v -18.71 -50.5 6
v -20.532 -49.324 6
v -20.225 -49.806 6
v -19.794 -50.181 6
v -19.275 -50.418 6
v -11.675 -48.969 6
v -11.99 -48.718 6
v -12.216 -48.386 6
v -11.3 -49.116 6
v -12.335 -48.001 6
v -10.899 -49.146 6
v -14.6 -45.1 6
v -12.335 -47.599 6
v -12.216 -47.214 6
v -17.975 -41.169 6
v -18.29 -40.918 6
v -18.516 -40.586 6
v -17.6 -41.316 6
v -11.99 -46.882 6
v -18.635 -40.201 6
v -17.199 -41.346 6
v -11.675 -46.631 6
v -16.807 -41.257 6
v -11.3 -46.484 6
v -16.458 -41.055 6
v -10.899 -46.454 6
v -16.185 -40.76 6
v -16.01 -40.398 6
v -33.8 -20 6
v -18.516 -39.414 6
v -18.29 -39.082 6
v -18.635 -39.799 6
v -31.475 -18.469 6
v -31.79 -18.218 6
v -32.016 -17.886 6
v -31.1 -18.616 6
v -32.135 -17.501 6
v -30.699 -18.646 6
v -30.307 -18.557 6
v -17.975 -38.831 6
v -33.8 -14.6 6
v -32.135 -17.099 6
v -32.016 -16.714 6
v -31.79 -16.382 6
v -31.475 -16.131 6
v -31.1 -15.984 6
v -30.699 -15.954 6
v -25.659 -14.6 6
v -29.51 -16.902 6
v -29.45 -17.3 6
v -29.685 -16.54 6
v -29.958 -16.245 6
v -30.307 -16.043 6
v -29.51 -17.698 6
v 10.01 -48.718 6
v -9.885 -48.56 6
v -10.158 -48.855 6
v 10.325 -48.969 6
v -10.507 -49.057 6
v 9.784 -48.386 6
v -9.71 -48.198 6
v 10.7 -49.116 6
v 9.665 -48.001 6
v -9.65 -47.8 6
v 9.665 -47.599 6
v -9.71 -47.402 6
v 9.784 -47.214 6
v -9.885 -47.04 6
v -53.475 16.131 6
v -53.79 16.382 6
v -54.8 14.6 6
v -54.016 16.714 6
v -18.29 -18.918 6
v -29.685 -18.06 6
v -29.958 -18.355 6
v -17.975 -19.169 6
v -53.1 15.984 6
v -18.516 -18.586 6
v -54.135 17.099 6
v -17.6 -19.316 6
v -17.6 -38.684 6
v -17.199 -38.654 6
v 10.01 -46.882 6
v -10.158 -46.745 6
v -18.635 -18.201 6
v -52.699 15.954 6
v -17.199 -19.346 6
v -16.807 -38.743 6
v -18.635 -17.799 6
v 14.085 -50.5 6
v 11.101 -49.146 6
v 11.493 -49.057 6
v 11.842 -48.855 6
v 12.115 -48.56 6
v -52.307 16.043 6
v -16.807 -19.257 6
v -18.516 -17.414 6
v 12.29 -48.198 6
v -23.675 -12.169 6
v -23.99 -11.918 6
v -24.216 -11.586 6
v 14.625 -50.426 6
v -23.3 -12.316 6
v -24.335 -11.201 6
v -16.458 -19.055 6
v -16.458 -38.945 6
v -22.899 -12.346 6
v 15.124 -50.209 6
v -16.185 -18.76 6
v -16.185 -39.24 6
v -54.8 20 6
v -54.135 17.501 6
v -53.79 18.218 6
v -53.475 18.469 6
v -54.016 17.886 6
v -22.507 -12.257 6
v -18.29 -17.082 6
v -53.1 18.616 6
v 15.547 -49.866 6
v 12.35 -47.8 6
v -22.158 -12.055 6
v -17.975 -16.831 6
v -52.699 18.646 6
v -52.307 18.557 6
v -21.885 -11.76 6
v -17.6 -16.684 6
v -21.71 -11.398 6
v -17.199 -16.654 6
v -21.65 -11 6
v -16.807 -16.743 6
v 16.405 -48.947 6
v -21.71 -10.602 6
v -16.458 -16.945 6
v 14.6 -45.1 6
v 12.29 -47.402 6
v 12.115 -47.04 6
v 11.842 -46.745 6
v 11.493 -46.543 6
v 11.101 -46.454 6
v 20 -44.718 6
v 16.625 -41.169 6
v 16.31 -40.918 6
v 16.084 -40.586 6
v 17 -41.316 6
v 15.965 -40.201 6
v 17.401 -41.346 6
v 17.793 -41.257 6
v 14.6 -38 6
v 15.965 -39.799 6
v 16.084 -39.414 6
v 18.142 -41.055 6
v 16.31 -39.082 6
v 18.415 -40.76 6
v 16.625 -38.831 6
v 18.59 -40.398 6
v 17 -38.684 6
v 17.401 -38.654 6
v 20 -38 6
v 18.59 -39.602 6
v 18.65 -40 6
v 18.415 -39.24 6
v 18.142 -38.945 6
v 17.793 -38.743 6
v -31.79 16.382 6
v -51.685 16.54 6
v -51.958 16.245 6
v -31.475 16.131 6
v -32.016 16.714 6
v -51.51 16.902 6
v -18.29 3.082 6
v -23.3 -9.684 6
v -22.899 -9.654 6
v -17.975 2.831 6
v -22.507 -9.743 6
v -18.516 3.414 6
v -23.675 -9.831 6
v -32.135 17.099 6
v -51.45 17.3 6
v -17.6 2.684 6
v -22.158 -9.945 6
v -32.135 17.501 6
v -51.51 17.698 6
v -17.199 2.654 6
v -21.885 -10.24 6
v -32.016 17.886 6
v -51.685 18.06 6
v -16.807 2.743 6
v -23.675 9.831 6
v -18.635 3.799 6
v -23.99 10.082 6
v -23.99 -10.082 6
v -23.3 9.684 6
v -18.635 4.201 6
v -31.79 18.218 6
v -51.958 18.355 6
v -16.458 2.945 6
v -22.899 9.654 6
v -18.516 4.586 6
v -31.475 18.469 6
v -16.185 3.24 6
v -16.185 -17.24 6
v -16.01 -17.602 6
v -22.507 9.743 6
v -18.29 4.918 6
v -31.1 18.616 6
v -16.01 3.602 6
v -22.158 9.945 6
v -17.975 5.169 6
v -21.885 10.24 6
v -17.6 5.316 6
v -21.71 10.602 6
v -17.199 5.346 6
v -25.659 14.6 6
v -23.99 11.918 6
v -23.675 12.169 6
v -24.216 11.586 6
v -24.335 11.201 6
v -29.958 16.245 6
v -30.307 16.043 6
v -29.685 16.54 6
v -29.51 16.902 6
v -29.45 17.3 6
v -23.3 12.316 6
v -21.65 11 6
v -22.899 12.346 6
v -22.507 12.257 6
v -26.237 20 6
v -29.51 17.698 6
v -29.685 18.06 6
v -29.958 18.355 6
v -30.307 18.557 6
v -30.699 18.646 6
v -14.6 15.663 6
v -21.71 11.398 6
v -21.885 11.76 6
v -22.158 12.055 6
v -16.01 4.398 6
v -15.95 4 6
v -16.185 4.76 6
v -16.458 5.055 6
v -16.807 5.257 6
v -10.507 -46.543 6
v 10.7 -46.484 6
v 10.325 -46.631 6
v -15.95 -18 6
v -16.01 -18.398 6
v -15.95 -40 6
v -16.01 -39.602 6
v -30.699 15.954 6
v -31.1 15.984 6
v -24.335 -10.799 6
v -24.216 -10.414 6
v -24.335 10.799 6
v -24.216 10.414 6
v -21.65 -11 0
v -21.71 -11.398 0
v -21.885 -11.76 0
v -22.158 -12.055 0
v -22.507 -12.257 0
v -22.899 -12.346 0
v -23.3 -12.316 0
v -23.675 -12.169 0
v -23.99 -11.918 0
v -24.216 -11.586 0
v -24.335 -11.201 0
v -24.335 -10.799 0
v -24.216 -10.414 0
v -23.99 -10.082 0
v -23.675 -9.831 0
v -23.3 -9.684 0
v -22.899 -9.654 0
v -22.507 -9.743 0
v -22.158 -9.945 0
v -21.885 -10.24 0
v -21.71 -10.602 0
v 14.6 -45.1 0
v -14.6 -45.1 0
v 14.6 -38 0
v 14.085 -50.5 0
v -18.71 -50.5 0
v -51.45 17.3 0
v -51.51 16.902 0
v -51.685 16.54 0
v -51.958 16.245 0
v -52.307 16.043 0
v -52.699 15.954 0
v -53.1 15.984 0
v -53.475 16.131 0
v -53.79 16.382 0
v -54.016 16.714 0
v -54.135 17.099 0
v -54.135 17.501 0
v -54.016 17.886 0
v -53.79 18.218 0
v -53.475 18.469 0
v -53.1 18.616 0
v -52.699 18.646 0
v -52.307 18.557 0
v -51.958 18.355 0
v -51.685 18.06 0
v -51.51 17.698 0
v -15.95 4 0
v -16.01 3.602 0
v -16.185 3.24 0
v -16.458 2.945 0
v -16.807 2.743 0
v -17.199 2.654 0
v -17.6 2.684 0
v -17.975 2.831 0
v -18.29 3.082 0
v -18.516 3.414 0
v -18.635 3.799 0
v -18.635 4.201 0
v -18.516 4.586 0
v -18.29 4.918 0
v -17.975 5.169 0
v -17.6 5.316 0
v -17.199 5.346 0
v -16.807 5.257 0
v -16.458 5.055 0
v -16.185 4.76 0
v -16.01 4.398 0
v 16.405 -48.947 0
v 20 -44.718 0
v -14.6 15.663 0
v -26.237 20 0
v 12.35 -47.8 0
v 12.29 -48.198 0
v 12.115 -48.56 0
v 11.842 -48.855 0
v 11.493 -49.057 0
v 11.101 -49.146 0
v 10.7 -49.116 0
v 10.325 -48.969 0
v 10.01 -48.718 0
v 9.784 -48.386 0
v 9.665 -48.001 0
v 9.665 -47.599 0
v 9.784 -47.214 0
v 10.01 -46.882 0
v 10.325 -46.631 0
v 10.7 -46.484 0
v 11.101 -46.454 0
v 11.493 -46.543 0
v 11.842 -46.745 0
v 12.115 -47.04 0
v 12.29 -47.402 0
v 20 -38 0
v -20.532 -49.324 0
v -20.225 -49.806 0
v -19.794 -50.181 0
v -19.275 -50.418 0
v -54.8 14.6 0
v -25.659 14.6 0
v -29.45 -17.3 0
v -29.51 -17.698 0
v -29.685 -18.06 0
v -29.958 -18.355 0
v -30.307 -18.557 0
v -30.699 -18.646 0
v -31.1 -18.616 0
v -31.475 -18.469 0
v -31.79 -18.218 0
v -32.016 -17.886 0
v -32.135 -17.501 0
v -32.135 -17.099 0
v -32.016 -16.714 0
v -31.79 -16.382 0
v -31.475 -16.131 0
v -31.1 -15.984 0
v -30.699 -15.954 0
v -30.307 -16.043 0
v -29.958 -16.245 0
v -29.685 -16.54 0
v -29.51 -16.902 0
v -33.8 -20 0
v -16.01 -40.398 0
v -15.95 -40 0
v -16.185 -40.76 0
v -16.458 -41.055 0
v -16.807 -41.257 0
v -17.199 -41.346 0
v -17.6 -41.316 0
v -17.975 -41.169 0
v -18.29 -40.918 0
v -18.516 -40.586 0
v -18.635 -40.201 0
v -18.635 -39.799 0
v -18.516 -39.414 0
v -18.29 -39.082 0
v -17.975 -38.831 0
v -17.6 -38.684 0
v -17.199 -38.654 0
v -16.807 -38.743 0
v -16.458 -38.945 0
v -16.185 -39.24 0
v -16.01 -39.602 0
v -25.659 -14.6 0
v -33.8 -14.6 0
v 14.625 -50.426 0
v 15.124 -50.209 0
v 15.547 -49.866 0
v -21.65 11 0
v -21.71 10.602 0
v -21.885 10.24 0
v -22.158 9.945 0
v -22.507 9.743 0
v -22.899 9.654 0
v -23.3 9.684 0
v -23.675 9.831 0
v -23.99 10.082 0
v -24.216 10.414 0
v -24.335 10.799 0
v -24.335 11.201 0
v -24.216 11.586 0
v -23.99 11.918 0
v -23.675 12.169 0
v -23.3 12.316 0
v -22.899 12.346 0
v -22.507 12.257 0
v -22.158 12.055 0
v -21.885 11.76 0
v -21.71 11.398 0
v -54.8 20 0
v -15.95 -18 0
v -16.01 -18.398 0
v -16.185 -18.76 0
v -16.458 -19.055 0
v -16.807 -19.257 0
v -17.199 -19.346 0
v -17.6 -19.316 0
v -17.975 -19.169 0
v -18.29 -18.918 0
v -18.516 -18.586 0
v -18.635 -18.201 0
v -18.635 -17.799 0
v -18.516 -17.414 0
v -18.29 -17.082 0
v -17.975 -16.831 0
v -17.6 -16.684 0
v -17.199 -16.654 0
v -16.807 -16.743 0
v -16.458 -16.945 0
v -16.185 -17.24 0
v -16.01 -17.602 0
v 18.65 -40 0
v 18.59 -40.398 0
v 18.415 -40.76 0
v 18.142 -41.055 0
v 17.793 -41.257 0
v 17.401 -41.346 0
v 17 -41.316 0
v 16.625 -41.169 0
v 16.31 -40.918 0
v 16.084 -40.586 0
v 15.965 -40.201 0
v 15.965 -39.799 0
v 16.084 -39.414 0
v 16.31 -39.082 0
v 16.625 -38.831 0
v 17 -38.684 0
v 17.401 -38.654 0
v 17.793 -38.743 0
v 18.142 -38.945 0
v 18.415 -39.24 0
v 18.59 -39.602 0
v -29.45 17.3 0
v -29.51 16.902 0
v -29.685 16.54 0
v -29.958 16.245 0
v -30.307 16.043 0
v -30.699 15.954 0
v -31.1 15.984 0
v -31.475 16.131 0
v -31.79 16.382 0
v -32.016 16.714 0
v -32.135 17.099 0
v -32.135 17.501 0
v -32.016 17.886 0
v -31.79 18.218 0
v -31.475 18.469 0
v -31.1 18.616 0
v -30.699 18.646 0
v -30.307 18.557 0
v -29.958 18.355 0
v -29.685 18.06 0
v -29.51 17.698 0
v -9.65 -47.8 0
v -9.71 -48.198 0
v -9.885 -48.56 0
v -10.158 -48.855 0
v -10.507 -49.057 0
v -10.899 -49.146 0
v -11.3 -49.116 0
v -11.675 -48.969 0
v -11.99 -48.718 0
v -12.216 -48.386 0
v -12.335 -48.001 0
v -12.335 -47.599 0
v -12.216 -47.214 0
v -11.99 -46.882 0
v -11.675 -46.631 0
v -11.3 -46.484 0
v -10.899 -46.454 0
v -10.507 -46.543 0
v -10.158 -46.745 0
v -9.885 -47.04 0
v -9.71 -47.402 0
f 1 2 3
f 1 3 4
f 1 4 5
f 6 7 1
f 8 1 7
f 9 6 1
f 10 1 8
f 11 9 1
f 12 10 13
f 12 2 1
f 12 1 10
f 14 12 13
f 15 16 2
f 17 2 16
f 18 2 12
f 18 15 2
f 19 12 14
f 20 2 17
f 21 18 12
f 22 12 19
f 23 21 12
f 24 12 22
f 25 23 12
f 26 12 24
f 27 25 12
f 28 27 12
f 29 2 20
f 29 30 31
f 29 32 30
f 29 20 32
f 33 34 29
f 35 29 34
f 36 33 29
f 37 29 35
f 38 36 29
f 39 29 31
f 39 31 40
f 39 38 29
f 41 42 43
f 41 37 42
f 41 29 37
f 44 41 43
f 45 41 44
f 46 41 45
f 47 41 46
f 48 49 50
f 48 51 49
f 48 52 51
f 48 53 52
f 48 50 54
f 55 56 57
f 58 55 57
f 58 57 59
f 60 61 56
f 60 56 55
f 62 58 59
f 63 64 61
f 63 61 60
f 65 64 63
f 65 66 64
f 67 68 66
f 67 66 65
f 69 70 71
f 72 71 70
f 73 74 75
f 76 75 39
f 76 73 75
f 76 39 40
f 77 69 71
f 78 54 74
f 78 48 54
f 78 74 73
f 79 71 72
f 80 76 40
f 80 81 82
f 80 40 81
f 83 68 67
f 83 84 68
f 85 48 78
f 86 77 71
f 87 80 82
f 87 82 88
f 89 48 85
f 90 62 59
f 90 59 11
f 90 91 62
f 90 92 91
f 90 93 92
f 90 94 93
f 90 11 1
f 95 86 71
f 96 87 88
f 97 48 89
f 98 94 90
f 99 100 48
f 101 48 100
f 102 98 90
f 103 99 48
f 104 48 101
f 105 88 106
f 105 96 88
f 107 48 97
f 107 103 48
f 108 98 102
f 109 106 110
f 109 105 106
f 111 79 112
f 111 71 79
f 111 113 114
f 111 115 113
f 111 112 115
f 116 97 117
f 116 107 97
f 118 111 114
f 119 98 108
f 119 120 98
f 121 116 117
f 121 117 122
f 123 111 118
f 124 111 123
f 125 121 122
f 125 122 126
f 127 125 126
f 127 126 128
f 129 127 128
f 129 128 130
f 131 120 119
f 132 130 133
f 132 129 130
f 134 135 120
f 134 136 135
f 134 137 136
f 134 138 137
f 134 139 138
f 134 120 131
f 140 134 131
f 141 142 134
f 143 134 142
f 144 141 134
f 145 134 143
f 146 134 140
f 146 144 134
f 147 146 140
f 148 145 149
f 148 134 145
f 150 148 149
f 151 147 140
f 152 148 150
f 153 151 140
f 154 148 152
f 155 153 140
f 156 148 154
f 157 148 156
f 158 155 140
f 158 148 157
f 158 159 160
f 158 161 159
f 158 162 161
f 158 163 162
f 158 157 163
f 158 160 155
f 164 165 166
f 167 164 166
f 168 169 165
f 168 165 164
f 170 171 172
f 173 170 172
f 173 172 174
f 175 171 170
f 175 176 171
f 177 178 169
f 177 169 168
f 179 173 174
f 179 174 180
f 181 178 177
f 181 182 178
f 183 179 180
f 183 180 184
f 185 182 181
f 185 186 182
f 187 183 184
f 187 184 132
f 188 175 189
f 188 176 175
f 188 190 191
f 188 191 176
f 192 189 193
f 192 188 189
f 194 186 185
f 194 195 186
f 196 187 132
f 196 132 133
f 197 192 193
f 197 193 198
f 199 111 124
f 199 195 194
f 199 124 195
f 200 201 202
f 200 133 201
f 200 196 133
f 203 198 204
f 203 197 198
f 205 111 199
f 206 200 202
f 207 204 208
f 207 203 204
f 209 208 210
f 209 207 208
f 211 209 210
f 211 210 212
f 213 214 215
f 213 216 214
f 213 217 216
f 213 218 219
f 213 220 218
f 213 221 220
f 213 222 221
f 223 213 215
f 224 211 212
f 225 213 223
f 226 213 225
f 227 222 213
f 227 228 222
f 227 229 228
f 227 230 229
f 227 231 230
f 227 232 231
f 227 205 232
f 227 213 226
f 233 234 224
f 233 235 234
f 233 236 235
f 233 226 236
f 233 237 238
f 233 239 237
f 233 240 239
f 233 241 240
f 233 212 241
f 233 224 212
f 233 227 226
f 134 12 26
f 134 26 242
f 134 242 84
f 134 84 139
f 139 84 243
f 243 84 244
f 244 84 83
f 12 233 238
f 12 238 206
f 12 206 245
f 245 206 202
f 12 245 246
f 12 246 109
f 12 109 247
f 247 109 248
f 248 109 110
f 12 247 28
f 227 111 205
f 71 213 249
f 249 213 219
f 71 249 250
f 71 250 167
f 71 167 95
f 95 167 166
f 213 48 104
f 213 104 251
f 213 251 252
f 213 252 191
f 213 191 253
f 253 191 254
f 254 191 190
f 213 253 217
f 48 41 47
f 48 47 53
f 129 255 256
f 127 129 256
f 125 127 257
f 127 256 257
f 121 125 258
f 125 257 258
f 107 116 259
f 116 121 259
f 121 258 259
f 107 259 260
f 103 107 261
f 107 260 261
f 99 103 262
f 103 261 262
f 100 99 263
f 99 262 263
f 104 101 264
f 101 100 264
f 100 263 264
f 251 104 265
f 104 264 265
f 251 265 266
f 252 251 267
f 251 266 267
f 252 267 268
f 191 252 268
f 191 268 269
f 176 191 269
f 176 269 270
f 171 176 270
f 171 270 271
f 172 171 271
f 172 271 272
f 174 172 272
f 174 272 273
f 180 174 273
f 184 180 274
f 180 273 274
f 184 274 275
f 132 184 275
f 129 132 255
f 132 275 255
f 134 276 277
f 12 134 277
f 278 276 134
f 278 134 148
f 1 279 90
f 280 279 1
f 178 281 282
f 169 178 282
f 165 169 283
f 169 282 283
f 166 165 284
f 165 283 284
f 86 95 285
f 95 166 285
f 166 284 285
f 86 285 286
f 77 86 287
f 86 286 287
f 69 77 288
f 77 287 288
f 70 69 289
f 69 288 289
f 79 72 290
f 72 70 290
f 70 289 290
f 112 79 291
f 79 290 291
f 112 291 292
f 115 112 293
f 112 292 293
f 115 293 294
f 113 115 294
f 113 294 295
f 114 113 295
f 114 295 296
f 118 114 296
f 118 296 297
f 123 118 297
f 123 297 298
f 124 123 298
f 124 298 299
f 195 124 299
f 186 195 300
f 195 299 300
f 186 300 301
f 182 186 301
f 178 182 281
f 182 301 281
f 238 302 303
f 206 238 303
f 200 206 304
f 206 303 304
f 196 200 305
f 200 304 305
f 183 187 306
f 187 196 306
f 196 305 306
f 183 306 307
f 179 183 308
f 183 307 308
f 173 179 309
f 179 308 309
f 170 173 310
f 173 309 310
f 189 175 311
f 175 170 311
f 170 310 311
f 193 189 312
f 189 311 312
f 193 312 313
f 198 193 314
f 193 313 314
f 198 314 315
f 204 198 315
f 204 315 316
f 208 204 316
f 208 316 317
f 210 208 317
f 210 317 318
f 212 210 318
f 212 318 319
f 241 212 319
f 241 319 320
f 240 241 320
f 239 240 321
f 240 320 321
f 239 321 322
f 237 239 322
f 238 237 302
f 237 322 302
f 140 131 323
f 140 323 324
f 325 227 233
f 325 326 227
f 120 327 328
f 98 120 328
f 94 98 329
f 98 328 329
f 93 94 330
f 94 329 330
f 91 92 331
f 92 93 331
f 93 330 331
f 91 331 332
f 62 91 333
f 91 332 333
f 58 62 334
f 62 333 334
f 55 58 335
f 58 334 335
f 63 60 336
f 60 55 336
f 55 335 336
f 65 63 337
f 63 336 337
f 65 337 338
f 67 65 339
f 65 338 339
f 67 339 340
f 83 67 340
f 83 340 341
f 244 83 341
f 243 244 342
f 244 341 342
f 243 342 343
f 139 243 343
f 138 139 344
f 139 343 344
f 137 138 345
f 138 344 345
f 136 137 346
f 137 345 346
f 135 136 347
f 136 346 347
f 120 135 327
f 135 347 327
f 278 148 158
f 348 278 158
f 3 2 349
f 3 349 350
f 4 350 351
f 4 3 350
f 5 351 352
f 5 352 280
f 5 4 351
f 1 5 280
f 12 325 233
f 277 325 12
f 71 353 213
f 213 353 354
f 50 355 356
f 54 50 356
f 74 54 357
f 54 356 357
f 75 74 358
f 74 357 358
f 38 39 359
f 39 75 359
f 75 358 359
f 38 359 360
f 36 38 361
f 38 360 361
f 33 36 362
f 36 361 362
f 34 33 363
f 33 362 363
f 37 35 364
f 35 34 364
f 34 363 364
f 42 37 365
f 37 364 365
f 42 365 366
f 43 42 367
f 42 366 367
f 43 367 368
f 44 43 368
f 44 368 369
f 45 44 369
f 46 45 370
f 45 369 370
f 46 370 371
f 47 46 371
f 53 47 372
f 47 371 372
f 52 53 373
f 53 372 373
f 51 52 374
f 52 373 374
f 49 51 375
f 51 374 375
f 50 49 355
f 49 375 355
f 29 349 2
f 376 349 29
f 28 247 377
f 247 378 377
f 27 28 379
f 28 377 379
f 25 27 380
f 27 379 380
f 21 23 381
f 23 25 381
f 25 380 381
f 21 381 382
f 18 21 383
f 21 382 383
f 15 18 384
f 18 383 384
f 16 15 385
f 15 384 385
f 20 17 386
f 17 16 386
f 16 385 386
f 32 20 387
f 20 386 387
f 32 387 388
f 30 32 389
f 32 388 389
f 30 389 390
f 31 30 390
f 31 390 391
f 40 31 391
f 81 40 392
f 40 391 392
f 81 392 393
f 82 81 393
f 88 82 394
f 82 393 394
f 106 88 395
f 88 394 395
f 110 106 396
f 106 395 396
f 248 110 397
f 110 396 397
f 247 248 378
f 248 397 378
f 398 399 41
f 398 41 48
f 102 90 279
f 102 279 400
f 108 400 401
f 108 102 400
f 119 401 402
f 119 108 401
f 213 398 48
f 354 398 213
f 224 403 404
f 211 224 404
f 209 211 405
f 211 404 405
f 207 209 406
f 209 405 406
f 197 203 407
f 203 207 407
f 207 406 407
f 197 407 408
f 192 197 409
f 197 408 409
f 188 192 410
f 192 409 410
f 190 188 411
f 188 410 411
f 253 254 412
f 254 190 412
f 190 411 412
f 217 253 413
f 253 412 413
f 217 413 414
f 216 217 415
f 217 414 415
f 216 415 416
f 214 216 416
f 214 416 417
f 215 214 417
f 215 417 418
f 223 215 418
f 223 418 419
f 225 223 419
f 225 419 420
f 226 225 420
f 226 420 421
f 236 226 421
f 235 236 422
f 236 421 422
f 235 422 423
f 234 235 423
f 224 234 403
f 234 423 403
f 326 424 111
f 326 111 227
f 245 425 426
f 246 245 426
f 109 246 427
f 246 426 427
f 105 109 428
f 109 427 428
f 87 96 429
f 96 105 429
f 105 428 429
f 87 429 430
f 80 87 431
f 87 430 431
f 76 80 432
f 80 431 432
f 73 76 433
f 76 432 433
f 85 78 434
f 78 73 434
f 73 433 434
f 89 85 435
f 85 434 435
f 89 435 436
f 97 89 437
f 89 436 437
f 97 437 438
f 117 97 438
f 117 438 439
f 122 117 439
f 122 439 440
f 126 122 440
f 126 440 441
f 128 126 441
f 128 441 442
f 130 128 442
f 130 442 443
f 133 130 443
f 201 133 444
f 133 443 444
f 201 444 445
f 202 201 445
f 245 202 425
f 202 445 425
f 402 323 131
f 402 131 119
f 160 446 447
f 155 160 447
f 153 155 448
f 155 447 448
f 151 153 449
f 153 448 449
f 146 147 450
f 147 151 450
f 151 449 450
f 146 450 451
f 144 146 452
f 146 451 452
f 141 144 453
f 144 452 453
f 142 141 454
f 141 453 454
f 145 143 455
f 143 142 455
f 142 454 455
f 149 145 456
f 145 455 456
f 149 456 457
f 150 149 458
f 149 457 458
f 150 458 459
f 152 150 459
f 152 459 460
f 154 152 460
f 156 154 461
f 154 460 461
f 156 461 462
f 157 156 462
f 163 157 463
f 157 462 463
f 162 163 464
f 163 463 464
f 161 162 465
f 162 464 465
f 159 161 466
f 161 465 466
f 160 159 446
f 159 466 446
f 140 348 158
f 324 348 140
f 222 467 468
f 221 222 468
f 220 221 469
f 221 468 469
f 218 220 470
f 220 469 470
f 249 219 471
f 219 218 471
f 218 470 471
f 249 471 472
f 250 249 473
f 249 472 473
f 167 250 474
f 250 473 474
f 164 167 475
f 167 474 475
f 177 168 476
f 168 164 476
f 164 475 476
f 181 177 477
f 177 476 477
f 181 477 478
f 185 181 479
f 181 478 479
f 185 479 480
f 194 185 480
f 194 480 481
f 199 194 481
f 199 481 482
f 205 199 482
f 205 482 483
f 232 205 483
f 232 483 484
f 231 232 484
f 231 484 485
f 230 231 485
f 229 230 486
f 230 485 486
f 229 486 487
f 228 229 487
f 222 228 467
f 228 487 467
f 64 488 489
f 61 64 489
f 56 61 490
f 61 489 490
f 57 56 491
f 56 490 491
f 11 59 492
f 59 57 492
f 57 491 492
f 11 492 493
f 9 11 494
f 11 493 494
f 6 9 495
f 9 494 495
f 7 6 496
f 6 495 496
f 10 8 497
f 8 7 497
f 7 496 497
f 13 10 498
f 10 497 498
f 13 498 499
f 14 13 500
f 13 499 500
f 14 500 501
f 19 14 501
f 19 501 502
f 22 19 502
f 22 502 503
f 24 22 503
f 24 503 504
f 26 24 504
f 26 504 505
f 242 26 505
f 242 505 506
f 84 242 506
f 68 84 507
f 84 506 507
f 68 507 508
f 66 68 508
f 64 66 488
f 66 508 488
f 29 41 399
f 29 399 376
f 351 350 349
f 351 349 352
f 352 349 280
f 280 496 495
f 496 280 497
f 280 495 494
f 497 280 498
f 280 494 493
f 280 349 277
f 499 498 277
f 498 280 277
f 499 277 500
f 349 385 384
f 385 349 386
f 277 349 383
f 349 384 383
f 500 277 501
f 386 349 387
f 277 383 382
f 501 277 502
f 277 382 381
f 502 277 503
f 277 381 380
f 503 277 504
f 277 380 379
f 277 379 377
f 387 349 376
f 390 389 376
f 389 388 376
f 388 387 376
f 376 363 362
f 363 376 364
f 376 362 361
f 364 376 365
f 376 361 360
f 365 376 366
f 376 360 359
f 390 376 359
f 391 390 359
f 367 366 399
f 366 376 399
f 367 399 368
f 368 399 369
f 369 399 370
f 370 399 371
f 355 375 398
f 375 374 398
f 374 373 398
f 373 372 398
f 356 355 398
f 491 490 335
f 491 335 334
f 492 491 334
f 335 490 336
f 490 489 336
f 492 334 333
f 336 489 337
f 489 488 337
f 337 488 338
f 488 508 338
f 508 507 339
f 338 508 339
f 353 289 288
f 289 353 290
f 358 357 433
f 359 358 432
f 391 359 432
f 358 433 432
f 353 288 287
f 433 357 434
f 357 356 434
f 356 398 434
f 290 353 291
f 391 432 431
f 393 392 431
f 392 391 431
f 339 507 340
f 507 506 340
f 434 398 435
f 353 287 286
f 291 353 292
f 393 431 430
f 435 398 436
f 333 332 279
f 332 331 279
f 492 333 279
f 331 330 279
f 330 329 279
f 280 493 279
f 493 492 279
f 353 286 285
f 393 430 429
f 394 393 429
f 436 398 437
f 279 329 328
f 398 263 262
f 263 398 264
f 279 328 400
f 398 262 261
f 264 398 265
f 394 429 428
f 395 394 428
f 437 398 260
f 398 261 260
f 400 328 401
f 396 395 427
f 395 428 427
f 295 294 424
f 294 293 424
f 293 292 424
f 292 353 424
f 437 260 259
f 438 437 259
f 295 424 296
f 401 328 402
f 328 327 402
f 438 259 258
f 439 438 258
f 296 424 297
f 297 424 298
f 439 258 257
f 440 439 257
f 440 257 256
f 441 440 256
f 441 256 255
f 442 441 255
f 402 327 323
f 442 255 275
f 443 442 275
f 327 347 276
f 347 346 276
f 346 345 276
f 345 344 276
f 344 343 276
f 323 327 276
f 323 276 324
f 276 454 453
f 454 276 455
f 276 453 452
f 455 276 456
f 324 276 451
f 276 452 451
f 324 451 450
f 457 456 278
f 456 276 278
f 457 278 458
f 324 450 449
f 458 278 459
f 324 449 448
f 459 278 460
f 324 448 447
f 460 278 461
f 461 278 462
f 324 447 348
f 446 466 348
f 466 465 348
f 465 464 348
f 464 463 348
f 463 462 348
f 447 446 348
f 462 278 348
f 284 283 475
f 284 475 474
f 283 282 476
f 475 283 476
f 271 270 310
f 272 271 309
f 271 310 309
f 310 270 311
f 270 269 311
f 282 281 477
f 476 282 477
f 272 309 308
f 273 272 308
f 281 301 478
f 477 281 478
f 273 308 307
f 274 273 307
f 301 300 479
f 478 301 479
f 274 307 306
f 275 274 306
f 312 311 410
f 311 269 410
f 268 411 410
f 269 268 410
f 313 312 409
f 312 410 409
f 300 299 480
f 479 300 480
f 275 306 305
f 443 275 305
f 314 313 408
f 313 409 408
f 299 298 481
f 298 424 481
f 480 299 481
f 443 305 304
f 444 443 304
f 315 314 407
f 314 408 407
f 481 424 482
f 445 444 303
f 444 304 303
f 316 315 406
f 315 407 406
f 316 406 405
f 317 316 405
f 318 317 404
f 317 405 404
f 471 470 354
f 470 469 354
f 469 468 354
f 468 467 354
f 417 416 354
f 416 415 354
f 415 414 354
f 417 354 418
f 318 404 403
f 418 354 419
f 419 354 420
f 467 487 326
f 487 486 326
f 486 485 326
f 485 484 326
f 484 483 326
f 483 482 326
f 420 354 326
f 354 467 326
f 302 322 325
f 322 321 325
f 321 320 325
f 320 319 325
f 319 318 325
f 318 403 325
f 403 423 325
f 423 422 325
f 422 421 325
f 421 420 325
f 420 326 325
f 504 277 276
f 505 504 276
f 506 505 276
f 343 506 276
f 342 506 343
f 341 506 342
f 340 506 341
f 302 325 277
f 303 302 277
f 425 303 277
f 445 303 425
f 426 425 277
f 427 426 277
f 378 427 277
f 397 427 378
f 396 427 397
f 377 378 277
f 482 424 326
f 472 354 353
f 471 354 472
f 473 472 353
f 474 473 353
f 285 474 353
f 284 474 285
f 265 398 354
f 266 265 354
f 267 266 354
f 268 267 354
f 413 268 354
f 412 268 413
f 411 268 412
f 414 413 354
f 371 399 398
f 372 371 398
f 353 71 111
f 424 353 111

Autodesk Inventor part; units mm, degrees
ref_plane "YZ Plane" through (0, 0, 0) normal (1, 0, 0) x (0, 1, 0)
ref_plane "XZ Plane" through (0, 0, 0) normal (0, 1, 0) x (-1, 0, 0)
ref_plane "XY Plane" through (0, 0, 0) normal (0, 0, 1) x (1, 0, 0)
ref_plane "작업 평면1" through (0, 0, 0) normal (0, 0, 1) x (1, 0, 0)
sketch "스케치1" plane through (0, 0, 0) normal (0, 0, 1) x (1, 0, 0)
  line L0 (-85.3, -15) -> (-85.3, -11.5) projected
  line L1 (-85.3, -15) -> (-79.3, -20.1) projected
  line L2 (-79.3, -20.1) -> (-26.2, -20.1) projected
  line L3 (-26.2, -20.1) -> (-20.2, -15) projected
  line L4 (-20.2, -15) -> (-20.2, 15) projected
  line L5 (-20.2, 15) -> (-26.2, 20.1) projected
  line L6 (-26.2, 20.1) -> (-79.3, 20.1) projected
  line L7 (-79.3, 20.1) -> (-85.3, 15) projected
  line L8 (-85.3, 11.5) -> (-85.3, 15) projected
  arc A0 (-82.3, 14.5) -> (-85.3, 11.5) centre (-82.3, 11.5) ccw projected
  line L9 (-28.8, 14.5) -> (-82.3, 14.5) projected
  arc A1 (-25.8, 11.5) -> (-28.8, 14.5) centre (-28.8, 11.5) ccw projected
  line L10 (-25.8, -11.5) -> (-25.8, 11.5) projected
  arc A2 (-28.8, -14.5) -> (-25.8, -11.5) centre (-28.8, -11.5) ccw projected
  line L11 (-82.3, -14.5) -> (-28.8, -14.5) projected
  arc A3 (-85.3, -11.5) -> (-82.3, -14.5) centre (-82.3, -11.5) ccw projected
  circle A4 centre (-74.8, 17.3) radius 1.35 projected
  circle A5 centre (-52.8, 17.3) radius 1.35 projected
  circle A6 centre (-30.8, 17.3) radius 1.35 projected
  circle A7 centre (-23, 11) radius 1.35 projected
  circle A8 centre (-74.8, -17.3) radius 1.35 projected
  circle A9 centre (-52.8, -17.3) radius 1.35 projected
  circle A10 centre (-30.8, -17.3) radius 1.35 projected
  circle A11 centre (-23, -11) radius 1.35 projected
  line L12 (-15, 14.5) -> (-11.5, 14.5) projected
  line L13 (-15, 14.5) -> (-20.1, 8.5) projected
  line L14 (-20.1, 8.5) -> (-20.1, -44.6) projected
  line L15 (-20.1, -44.6) -> (-15, -50.6) projected
  line L16 (-15, -50.6) -> (15, -50.6) projected
  line L17 (15, -50.6) -> (20.1, -44.6) projected
  line L18 (20.1, -44.6) -> (20.1, 8.5) projected
  line L19 (20.1, 8.5) -> (15, 14.5) projected
  line L20 (11.5, 14.5) -> (15, 14.5) projected
  arc A12 (14.5, 11.5) -> (11.5, 14.5) centre (11.5, 11.5) ccw projected
  line L21 (14.5, -42) -> (14.5, 11.5) projected
  arc A13 (11.5, -45) -> (14.5, -42) centre (11.5, -42) ccw projected
  line L22 (-11.5, -45) -> (11.5, -45) projected
  arc A14 (-14.5, -42) -> (-11.5, -45) centre (-11.5, -42) ccw projected
  line L23 (-14.5, 11.5) -> (-14.5, -42) projected
  arc A15 (-11.5, 14.5) -> (-14.5, 11.5) centre (-11.5, 11.5) ccw projected
  circle A16 centre (17.3, 4) radius 1.35 projected
  circle A17 centre (17.3, -18) radius 1.35 projected
  circle A18 centre (17.3, -40) radius 1.35 projected
  circle A19 centre (11, -47.8) radius 1.35 projected
  circle A20 centre (-17.3, 4) radius 1.35 projected
  circle A21 centre (-17.3, -18) radius 1.35 projected
  circle A22 centre (-17.3, -40) radius 1.35 projected
  circle A23 centre (-11, -47.8) radius 1.35 projected
  arc A24 (-14.6, -42) -> (-11.5, -45.1) centre (-11.5, -42) ccw
  line L24 (-11.5, -45.1) -> (11.5, -45.1)
  arc A25 (11.5, -45.1) -> (14.6, -42) centre (11.5, -42) ccw
  line L25 (14.6, -42) -> (14.6, 11.5)
  arc A26 (14.6, 11.5) -> (12.5954, 14.4) centre (11.5, 11.5) ccw
  line L26 (12.5954, 14.4) -> (14.9538, 14.4)
  line L27 (14.9538, 14.4) -> (20, 8.4632)
  line L28 (20, 8.4632) -> (20, -44.5632)
  line L29 (14.9538, -50.5) -> (-14.9538, -50.5)
  line L30 (-14.6, 11.5) -> (-14.6, -42)
  arc A27 (-25.7, 11.5) -> (-28.8, 14.6) centre (-28.8, 11.5) ccw
  line L31 (-28.8, 14.6) -> (-82.3, 14.6)
  arc A28 (-82.3, 14.6) -> (-85.2, 12.5954) centre (-82.3, 11.5) ccw
  line L32 (-85.2, 12.5954) -> (-85.2, 14.9538)
  line L33 (-85.2, 14.9538) -> (-79.2632, 20)
  line L34 (-79.2632, 20) -> (-26.2368, 20)
  line L35 (-20.3, -14.9538) -> (-26.2368, -20)
  line L36 (-26.2368, -20) -> (-79.2632, -20)
  line L37 (-79.2632, -20) -> (-85.2, -14.9538)
  line L38 (-85.2, -14.9538) -> (-85.2, -12.5954)
  arc A29 (-85.2, -12.5954) -> (-82.3, -14.6) centre (-82.3, -11.5) ccw
  line L39 (-82.3, -14.6) -> (-28.8, -14.6)
  arc A30 (-28.8, -14.6) -> (-25.7, -11.5) centre (-28.8, -11.5) ccw
  line L40 (-25.7, -11.5) -> (-25.7, 11.5)
  line L41 (-14.6, 15.6629) -> (-14.6, -30)
  circle A31 centre (-23, -11) radius 1.35
  circle A32 centre (-23, 11) radius 1.35
  circle A33 centre (-17.3, -18) radius 1.35
  circle A34 centre (-17.3, 4) radius 1.35
  line L42 (-28.8, 14.6) -> (-54.8, 14.6)
  line L43 (-54.8, 14.6) -> (-54.8, 20)
  line L44 (-54.8, 20) -> (-28.8, 20)
  line L45 (-28.8, 20) -> (-28.8, 14.6)
  line L46 (-28.8, 14.6) -> (-25.7, 14.6)
  line L47 (-28.8, 19.6629) -> (-28.8, 14.6)
  line L48 (-28.8, -14.6) -> (-33.8, -14.6)
  line L49 (-33.8, -14.6) -> (-33.8, -20)
  line L50 (-33.8, -20) -> (-28.8, -20)
  line L51 (-28.8, -20) -> (-28.8, -14.6)
  line L52 (-28.8, -14.6) -> (-25.659, -14.6)
  line L53 (-26.2368, -20) -> (-28.8, -20)
  line L54 (-28.8, -20) -> (-28.8, -14.6)
  line L55 (-14.6, -30) -> (-14.6, -45.1)
  line L56 (-14.6, -50.5) -> (-20, -50.5)
  line L57 (-14.5, -50.5) -> (-7.5, -50.5)
  line L58 (-7.5, -50.5) -> (-7.5, -45.1)
  line L59 (-7.5, -45.1) -> (-14.5, -45.1)
  line L60 (-14.5, -45.1) -> (-14.5, -50.5)
  line L61 (-20, -50.5) -> (-33.8, -20)
  line L62 (-25.659, -14.6) -> (-25.659, 14.6)
  line L63 (-14.5, -45.1) -> (-14.6, -45.1)
  line L64 (-7.5, -45.1) -> (14.9538, -45.1)
  line L65 (14.9538, -45.1) -> (14.9538, -50.5)
  line L66 (14.9538, -50.5) -> (-7.5, -50.5)
  line L67 (-7.5, -50.5) -> (-7.5, -45.1)
  circle A35 centre (11, -47.8) radius 1.35
  line L68 (14.6, -42) -> (20, -42)
  line L69 (20, -42) -> (20, -45.1)
  line L70 (20, -45.1) -> (14.6, -45.1)
  line L71 (14.6, -45.1) -> (14.6, -42)
  line L72 (20, -42) -> (14.6, -42)
  line L73 (14.6, -42) -> (14.6, -38)
  line L74 (14.6, -38) -> (20, -38)
  line L75 (20, -38) -> (20, -42)
  line L76 (20, -45.1) -> (14.9538, -50.5)
  circle A36 centre (-30.8, -17.3) radius 1.35
  circle A37 centre (-17.3, -40) radius 1.35
  circle A38 centre (-11, -47.8) radius 1.35
  circle A39 centre (17.3, -40) radius 1.35
  line L77 (-25.7, 14.6) -> (-25.659, 14.6)
  line L78 (-26.2368, 20) -> (-14.6, 15.6629)
  point P0 (0, 0)
  point P1 (-14.6, -30)
  point P2 (-28.8, 14.6)
  point P3 (-28.8, -14.6)
  point P4 (-26.2368, -20)
  point P5 (-26.0824, -20)
  point P6 (-33.7548, -20.1)
  point P7 (16.4054, -48.9466)
  point P8 (20, -44.7176)
  point P9 (-11.5, -45.1)
  point P10 (-14.6, -30)
  dimension "d0" = 0.1
  dimension "d1" = 0.1
  dimension "d3" = 2.7
  dimension "d4" = 2.7
  dimension "d5" = 2.7
  dimension "d6" = 2.7
  dimension "d9" = 26
  dimension "d10" = 5
  dimension "d11" = 7
  dimension "d16" = 4
extrude "돌출4" add sketch "스케치1" along normal blind 6 contours L61 L36 L51 L52 L62 L77 L46 L45 L34 L78 L5 L4 L3 L2 | L2 L3 L4 L5 L78 L41 L12 L13 L14 L15 L56 L61 | L49 L39 L51 L36 | L15 L14 L13 L12 L41 L30 L55 L63 L60 L29 L56 | L76 L65 L70 L17 | L60 L59 L24 L58 L29 | L45 L31 L43 L34 | L70 L64 L71 L68 L28 L69 L17 | L29 L58 L24 L64 L65 | L68 L25 L74 L28
fillet "모깎기3" radius 2 2 edges at (-20, -50.5, 3) (14.9538, -50.5, 3)
properties part number "leg_ver2" material "PMMA 플라스틱"
